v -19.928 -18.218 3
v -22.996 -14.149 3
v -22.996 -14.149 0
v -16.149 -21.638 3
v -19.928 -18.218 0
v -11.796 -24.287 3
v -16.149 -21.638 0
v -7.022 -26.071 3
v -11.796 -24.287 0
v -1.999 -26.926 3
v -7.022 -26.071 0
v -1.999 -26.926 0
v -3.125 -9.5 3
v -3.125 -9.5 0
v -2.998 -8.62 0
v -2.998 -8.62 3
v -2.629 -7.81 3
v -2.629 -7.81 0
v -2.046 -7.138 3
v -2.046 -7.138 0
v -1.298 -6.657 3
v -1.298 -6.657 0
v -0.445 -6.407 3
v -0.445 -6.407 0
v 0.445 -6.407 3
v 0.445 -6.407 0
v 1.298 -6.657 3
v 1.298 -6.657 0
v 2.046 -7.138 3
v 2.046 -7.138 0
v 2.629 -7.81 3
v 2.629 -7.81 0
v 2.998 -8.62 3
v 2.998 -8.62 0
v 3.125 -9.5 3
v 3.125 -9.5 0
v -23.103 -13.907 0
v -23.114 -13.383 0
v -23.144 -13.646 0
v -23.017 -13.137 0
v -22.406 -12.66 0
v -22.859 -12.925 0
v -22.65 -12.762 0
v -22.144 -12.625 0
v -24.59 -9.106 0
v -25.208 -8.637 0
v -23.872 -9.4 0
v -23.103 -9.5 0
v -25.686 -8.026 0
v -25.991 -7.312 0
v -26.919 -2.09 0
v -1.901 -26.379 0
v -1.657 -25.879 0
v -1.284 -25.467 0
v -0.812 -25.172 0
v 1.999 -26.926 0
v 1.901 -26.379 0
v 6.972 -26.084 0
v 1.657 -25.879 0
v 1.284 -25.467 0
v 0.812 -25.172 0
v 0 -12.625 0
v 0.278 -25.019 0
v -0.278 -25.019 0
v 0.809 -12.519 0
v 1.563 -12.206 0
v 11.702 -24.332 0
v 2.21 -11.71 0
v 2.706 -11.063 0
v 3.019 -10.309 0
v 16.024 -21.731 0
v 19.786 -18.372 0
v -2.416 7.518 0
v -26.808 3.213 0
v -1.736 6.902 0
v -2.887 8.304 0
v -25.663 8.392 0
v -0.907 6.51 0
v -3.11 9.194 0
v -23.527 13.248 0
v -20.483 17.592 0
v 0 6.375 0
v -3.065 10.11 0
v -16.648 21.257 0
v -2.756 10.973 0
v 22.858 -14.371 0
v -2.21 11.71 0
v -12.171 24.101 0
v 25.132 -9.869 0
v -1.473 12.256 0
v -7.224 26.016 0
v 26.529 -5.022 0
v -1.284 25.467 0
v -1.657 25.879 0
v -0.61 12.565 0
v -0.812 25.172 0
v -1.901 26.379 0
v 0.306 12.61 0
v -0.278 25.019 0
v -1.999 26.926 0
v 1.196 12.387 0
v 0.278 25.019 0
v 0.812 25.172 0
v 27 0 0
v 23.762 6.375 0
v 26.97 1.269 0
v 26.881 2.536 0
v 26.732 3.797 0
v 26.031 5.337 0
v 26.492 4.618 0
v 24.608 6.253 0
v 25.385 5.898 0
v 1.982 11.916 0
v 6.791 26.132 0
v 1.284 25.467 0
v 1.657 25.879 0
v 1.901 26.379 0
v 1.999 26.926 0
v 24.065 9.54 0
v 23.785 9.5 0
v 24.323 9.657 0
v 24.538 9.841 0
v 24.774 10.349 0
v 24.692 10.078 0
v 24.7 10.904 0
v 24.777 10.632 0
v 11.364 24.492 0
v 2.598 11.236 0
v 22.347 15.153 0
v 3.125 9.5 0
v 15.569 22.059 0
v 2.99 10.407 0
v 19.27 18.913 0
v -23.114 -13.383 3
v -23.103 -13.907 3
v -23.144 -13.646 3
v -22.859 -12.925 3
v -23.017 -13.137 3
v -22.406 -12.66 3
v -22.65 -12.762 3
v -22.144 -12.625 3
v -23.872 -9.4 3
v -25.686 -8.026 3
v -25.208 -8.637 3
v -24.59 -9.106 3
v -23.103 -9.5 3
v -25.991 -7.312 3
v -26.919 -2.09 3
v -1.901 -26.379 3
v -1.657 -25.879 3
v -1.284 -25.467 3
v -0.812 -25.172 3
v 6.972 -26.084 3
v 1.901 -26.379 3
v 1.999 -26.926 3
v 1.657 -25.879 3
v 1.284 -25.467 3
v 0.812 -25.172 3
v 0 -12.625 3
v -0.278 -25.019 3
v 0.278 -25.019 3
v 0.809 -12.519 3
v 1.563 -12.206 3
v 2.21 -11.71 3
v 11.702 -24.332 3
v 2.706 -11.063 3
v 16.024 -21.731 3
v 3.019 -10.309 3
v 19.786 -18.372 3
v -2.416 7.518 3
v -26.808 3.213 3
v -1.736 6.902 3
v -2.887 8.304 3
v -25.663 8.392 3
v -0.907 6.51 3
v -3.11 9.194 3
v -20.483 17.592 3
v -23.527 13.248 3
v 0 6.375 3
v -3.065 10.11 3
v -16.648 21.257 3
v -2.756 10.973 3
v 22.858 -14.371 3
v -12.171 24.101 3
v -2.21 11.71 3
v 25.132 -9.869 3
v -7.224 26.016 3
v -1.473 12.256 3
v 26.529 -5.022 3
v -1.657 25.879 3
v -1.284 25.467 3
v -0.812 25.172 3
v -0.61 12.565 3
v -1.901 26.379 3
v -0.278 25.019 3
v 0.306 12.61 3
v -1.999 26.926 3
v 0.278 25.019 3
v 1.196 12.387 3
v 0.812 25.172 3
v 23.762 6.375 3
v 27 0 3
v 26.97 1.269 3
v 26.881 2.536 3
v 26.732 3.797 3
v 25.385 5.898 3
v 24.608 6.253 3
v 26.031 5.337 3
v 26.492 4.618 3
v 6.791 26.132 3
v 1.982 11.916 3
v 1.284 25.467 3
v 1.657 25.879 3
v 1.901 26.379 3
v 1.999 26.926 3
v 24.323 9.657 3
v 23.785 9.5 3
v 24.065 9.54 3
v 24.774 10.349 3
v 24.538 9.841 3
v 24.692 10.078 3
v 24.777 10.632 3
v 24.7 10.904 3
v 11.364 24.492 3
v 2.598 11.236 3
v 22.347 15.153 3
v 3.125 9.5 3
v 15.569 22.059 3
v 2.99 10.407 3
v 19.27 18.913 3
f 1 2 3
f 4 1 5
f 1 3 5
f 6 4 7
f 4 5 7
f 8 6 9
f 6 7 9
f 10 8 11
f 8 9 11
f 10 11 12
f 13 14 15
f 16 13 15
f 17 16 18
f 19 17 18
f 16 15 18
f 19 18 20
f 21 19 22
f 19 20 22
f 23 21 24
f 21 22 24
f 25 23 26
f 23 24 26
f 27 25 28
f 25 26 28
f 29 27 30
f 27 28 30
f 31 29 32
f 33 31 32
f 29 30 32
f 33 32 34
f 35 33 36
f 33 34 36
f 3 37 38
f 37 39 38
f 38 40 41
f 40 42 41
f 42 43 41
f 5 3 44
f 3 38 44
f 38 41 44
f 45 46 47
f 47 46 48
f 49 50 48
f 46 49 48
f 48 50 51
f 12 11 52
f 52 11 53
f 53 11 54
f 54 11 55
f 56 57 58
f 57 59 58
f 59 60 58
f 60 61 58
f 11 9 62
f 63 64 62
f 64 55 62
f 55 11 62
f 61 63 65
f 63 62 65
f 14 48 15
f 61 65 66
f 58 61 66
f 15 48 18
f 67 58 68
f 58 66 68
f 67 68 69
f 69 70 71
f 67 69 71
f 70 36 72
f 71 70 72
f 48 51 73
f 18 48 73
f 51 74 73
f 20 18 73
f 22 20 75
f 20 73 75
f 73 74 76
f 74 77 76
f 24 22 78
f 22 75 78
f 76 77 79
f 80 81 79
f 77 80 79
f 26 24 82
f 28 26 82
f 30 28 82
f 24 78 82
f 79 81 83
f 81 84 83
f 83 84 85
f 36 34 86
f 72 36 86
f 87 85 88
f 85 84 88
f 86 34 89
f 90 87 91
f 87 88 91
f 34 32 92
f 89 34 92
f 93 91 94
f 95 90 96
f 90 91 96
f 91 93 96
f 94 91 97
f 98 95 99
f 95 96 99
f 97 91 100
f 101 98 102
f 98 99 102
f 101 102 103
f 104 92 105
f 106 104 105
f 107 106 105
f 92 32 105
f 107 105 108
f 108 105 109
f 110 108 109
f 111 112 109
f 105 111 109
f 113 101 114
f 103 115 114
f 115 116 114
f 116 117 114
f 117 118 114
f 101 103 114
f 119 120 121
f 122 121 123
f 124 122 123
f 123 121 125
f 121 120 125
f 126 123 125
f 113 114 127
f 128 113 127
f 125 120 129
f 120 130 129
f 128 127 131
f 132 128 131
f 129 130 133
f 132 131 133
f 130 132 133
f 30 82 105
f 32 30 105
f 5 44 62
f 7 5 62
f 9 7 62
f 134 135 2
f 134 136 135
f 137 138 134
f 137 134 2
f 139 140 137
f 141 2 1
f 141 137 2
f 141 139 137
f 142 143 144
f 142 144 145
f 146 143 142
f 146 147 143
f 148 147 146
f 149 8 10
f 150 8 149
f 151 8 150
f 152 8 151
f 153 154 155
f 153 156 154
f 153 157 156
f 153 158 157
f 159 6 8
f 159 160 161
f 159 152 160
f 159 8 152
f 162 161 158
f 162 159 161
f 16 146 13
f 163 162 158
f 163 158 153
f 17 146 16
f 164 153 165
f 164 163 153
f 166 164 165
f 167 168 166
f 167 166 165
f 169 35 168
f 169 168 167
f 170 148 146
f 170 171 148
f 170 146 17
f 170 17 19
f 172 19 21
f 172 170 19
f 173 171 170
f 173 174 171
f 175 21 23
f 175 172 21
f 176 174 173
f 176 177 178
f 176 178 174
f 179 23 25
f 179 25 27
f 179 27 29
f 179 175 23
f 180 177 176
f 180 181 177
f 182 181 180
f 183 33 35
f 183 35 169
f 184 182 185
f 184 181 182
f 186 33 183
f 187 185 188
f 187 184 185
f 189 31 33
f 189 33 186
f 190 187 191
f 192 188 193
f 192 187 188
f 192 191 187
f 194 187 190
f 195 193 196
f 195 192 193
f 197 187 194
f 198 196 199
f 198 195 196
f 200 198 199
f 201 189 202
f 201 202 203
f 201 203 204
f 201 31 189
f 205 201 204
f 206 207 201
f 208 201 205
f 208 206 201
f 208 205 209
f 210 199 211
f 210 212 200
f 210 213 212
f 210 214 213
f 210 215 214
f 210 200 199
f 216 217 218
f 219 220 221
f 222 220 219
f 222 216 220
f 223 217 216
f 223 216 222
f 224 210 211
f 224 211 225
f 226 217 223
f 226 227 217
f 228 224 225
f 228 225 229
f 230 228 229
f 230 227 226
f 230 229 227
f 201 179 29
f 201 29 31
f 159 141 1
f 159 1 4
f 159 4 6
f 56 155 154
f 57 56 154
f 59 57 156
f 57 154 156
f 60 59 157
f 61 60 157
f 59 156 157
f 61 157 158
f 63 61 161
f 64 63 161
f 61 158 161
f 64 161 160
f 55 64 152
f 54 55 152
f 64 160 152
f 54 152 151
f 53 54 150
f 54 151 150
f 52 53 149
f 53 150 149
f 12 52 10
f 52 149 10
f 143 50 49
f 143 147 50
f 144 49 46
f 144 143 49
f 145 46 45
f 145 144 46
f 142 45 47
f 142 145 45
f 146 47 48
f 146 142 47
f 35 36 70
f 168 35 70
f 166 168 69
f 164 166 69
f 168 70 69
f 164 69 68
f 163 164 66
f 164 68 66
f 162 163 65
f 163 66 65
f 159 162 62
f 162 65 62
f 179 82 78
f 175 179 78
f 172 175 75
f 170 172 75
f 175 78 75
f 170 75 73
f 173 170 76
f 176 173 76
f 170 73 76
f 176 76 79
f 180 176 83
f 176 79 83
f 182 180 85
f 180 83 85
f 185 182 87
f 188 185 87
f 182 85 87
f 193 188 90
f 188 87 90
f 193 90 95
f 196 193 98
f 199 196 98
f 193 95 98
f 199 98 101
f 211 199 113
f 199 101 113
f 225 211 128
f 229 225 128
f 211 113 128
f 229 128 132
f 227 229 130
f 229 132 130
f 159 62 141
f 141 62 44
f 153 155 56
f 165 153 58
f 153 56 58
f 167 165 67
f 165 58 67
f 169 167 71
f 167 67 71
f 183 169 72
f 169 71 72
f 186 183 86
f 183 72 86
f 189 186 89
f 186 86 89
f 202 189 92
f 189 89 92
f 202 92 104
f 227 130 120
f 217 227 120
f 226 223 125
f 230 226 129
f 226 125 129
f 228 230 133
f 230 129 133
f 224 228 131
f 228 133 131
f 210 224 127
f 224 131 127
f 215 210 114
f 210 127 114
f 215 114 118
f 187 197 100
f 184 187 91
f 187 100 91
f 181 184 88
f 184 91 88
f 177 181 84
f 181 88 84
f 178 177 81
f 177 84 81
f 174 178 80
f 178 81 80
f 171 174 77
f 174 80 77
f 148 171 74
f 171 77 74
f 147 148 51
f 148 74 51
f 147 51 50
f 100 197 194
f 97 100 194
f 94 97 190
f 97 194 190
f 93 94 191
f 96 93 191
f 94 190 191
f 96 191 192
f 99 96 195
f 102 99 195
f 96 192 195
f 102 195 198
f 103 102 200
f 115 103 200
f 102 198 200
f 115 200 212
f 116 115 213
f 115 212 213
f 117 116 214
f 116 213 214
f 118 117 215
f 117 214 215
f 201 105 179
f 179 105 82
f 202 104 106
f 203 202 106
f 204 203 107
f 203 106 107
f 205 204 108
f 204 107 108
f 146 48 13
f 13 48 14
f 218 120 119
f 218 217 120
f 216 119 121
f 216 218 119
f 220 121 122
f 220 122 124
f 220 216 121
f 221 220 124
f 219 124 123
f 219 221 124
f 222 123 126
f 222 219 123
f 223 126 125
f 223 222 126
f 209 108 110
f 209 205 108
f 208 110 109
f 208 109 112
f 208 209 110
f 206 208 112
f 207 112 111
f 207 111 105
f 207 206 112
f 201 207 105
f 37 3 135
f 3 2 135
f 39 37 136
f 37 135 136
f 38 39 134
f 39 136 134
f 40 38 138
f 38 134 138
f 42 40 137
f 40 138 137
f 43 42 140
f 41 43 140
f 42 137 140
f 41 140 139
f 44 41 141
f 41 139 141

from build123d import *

# Parameters (mm, degrees)
F1_DEPTH = 3
F2_R     = 3
F3_R     = 1
F5_DEPTH = 25


with BuildPart() as f1:
    # F0 (on Top) → F1 (new body)
    with BuildSketch(Plane.XY):
        with BuildLine():
            ThreePointArc((-23.866491, -12.625), (6.504028, -26.204916), (27, 0))
            ThreePointArc((27, 0), (26.808472, 3.210273), (26.236604, 6.375))
            Line((26.236604, 6.375), (0, 6.375))
            ThreePointArc((0, 6.375), (-2.209709, 11.709709), (3.125, 9.5))
            Line((3.125, 9.5), (25.273504, 9.5))
            ThreePointArc((25.273504, 9.5), (-9.5, 25.273504), (-25.273504, -9.5))
            Line((-25.273504, -9.5), (-3.125, -9.5))
            ThreePointArc((-3.125, -9.5), (0, -6.375), (3.125, -9.5))
            ThreePointArc((3.125, -9.5), (2.209709, -11.709709), (0, -12.625))
            Line((0, -12.625), (-23.866491, -12.625))
        make_face()
    extrude(amount=F1_DEPTH)

    # F2
    f2_edges = [f1.edges().sort_by_distance(p)[0] for p in [
        (-25.273504, -9.5, 1.5),
        (26.236604, 6.375, 1.5),
    ]]
    fillet(f2_edges, radius=F2_R)

    # F3
    f3_edges = [f1.edges().sort_by_distance(p)[0] for p in [
        (25.273504, 9.5, 1.5),
        (-23.866491, -12.625, 1.5),
    ]]
    fillet(f3_edges, radius=F3_R)

    # F4 (on face) → F5 (cut)
    with BuildSketch(Plane.XY.offset(3)):
        with BuildLine():
            ThreePointArc((1.998628, 26.925926), (0, 27), (-1.998628, 26.925926))
            ThreePointArc((-1.998628, 26.925926), (0, 25), (1.998628, 26.925926))
        make_face()
        with BuildLine():
            ThreePointArc((-1.998628, -26.925926), (0, -27), (1.998628, -26.925926))
            ThreePointArc((1.998628, -26.925926), (0, -25), (-1.998628, -26.925926))
        make_face()
    extrude(amount=-F5_DEPTH, mode=Mode.SUBTRACT)


solid = f1.part
